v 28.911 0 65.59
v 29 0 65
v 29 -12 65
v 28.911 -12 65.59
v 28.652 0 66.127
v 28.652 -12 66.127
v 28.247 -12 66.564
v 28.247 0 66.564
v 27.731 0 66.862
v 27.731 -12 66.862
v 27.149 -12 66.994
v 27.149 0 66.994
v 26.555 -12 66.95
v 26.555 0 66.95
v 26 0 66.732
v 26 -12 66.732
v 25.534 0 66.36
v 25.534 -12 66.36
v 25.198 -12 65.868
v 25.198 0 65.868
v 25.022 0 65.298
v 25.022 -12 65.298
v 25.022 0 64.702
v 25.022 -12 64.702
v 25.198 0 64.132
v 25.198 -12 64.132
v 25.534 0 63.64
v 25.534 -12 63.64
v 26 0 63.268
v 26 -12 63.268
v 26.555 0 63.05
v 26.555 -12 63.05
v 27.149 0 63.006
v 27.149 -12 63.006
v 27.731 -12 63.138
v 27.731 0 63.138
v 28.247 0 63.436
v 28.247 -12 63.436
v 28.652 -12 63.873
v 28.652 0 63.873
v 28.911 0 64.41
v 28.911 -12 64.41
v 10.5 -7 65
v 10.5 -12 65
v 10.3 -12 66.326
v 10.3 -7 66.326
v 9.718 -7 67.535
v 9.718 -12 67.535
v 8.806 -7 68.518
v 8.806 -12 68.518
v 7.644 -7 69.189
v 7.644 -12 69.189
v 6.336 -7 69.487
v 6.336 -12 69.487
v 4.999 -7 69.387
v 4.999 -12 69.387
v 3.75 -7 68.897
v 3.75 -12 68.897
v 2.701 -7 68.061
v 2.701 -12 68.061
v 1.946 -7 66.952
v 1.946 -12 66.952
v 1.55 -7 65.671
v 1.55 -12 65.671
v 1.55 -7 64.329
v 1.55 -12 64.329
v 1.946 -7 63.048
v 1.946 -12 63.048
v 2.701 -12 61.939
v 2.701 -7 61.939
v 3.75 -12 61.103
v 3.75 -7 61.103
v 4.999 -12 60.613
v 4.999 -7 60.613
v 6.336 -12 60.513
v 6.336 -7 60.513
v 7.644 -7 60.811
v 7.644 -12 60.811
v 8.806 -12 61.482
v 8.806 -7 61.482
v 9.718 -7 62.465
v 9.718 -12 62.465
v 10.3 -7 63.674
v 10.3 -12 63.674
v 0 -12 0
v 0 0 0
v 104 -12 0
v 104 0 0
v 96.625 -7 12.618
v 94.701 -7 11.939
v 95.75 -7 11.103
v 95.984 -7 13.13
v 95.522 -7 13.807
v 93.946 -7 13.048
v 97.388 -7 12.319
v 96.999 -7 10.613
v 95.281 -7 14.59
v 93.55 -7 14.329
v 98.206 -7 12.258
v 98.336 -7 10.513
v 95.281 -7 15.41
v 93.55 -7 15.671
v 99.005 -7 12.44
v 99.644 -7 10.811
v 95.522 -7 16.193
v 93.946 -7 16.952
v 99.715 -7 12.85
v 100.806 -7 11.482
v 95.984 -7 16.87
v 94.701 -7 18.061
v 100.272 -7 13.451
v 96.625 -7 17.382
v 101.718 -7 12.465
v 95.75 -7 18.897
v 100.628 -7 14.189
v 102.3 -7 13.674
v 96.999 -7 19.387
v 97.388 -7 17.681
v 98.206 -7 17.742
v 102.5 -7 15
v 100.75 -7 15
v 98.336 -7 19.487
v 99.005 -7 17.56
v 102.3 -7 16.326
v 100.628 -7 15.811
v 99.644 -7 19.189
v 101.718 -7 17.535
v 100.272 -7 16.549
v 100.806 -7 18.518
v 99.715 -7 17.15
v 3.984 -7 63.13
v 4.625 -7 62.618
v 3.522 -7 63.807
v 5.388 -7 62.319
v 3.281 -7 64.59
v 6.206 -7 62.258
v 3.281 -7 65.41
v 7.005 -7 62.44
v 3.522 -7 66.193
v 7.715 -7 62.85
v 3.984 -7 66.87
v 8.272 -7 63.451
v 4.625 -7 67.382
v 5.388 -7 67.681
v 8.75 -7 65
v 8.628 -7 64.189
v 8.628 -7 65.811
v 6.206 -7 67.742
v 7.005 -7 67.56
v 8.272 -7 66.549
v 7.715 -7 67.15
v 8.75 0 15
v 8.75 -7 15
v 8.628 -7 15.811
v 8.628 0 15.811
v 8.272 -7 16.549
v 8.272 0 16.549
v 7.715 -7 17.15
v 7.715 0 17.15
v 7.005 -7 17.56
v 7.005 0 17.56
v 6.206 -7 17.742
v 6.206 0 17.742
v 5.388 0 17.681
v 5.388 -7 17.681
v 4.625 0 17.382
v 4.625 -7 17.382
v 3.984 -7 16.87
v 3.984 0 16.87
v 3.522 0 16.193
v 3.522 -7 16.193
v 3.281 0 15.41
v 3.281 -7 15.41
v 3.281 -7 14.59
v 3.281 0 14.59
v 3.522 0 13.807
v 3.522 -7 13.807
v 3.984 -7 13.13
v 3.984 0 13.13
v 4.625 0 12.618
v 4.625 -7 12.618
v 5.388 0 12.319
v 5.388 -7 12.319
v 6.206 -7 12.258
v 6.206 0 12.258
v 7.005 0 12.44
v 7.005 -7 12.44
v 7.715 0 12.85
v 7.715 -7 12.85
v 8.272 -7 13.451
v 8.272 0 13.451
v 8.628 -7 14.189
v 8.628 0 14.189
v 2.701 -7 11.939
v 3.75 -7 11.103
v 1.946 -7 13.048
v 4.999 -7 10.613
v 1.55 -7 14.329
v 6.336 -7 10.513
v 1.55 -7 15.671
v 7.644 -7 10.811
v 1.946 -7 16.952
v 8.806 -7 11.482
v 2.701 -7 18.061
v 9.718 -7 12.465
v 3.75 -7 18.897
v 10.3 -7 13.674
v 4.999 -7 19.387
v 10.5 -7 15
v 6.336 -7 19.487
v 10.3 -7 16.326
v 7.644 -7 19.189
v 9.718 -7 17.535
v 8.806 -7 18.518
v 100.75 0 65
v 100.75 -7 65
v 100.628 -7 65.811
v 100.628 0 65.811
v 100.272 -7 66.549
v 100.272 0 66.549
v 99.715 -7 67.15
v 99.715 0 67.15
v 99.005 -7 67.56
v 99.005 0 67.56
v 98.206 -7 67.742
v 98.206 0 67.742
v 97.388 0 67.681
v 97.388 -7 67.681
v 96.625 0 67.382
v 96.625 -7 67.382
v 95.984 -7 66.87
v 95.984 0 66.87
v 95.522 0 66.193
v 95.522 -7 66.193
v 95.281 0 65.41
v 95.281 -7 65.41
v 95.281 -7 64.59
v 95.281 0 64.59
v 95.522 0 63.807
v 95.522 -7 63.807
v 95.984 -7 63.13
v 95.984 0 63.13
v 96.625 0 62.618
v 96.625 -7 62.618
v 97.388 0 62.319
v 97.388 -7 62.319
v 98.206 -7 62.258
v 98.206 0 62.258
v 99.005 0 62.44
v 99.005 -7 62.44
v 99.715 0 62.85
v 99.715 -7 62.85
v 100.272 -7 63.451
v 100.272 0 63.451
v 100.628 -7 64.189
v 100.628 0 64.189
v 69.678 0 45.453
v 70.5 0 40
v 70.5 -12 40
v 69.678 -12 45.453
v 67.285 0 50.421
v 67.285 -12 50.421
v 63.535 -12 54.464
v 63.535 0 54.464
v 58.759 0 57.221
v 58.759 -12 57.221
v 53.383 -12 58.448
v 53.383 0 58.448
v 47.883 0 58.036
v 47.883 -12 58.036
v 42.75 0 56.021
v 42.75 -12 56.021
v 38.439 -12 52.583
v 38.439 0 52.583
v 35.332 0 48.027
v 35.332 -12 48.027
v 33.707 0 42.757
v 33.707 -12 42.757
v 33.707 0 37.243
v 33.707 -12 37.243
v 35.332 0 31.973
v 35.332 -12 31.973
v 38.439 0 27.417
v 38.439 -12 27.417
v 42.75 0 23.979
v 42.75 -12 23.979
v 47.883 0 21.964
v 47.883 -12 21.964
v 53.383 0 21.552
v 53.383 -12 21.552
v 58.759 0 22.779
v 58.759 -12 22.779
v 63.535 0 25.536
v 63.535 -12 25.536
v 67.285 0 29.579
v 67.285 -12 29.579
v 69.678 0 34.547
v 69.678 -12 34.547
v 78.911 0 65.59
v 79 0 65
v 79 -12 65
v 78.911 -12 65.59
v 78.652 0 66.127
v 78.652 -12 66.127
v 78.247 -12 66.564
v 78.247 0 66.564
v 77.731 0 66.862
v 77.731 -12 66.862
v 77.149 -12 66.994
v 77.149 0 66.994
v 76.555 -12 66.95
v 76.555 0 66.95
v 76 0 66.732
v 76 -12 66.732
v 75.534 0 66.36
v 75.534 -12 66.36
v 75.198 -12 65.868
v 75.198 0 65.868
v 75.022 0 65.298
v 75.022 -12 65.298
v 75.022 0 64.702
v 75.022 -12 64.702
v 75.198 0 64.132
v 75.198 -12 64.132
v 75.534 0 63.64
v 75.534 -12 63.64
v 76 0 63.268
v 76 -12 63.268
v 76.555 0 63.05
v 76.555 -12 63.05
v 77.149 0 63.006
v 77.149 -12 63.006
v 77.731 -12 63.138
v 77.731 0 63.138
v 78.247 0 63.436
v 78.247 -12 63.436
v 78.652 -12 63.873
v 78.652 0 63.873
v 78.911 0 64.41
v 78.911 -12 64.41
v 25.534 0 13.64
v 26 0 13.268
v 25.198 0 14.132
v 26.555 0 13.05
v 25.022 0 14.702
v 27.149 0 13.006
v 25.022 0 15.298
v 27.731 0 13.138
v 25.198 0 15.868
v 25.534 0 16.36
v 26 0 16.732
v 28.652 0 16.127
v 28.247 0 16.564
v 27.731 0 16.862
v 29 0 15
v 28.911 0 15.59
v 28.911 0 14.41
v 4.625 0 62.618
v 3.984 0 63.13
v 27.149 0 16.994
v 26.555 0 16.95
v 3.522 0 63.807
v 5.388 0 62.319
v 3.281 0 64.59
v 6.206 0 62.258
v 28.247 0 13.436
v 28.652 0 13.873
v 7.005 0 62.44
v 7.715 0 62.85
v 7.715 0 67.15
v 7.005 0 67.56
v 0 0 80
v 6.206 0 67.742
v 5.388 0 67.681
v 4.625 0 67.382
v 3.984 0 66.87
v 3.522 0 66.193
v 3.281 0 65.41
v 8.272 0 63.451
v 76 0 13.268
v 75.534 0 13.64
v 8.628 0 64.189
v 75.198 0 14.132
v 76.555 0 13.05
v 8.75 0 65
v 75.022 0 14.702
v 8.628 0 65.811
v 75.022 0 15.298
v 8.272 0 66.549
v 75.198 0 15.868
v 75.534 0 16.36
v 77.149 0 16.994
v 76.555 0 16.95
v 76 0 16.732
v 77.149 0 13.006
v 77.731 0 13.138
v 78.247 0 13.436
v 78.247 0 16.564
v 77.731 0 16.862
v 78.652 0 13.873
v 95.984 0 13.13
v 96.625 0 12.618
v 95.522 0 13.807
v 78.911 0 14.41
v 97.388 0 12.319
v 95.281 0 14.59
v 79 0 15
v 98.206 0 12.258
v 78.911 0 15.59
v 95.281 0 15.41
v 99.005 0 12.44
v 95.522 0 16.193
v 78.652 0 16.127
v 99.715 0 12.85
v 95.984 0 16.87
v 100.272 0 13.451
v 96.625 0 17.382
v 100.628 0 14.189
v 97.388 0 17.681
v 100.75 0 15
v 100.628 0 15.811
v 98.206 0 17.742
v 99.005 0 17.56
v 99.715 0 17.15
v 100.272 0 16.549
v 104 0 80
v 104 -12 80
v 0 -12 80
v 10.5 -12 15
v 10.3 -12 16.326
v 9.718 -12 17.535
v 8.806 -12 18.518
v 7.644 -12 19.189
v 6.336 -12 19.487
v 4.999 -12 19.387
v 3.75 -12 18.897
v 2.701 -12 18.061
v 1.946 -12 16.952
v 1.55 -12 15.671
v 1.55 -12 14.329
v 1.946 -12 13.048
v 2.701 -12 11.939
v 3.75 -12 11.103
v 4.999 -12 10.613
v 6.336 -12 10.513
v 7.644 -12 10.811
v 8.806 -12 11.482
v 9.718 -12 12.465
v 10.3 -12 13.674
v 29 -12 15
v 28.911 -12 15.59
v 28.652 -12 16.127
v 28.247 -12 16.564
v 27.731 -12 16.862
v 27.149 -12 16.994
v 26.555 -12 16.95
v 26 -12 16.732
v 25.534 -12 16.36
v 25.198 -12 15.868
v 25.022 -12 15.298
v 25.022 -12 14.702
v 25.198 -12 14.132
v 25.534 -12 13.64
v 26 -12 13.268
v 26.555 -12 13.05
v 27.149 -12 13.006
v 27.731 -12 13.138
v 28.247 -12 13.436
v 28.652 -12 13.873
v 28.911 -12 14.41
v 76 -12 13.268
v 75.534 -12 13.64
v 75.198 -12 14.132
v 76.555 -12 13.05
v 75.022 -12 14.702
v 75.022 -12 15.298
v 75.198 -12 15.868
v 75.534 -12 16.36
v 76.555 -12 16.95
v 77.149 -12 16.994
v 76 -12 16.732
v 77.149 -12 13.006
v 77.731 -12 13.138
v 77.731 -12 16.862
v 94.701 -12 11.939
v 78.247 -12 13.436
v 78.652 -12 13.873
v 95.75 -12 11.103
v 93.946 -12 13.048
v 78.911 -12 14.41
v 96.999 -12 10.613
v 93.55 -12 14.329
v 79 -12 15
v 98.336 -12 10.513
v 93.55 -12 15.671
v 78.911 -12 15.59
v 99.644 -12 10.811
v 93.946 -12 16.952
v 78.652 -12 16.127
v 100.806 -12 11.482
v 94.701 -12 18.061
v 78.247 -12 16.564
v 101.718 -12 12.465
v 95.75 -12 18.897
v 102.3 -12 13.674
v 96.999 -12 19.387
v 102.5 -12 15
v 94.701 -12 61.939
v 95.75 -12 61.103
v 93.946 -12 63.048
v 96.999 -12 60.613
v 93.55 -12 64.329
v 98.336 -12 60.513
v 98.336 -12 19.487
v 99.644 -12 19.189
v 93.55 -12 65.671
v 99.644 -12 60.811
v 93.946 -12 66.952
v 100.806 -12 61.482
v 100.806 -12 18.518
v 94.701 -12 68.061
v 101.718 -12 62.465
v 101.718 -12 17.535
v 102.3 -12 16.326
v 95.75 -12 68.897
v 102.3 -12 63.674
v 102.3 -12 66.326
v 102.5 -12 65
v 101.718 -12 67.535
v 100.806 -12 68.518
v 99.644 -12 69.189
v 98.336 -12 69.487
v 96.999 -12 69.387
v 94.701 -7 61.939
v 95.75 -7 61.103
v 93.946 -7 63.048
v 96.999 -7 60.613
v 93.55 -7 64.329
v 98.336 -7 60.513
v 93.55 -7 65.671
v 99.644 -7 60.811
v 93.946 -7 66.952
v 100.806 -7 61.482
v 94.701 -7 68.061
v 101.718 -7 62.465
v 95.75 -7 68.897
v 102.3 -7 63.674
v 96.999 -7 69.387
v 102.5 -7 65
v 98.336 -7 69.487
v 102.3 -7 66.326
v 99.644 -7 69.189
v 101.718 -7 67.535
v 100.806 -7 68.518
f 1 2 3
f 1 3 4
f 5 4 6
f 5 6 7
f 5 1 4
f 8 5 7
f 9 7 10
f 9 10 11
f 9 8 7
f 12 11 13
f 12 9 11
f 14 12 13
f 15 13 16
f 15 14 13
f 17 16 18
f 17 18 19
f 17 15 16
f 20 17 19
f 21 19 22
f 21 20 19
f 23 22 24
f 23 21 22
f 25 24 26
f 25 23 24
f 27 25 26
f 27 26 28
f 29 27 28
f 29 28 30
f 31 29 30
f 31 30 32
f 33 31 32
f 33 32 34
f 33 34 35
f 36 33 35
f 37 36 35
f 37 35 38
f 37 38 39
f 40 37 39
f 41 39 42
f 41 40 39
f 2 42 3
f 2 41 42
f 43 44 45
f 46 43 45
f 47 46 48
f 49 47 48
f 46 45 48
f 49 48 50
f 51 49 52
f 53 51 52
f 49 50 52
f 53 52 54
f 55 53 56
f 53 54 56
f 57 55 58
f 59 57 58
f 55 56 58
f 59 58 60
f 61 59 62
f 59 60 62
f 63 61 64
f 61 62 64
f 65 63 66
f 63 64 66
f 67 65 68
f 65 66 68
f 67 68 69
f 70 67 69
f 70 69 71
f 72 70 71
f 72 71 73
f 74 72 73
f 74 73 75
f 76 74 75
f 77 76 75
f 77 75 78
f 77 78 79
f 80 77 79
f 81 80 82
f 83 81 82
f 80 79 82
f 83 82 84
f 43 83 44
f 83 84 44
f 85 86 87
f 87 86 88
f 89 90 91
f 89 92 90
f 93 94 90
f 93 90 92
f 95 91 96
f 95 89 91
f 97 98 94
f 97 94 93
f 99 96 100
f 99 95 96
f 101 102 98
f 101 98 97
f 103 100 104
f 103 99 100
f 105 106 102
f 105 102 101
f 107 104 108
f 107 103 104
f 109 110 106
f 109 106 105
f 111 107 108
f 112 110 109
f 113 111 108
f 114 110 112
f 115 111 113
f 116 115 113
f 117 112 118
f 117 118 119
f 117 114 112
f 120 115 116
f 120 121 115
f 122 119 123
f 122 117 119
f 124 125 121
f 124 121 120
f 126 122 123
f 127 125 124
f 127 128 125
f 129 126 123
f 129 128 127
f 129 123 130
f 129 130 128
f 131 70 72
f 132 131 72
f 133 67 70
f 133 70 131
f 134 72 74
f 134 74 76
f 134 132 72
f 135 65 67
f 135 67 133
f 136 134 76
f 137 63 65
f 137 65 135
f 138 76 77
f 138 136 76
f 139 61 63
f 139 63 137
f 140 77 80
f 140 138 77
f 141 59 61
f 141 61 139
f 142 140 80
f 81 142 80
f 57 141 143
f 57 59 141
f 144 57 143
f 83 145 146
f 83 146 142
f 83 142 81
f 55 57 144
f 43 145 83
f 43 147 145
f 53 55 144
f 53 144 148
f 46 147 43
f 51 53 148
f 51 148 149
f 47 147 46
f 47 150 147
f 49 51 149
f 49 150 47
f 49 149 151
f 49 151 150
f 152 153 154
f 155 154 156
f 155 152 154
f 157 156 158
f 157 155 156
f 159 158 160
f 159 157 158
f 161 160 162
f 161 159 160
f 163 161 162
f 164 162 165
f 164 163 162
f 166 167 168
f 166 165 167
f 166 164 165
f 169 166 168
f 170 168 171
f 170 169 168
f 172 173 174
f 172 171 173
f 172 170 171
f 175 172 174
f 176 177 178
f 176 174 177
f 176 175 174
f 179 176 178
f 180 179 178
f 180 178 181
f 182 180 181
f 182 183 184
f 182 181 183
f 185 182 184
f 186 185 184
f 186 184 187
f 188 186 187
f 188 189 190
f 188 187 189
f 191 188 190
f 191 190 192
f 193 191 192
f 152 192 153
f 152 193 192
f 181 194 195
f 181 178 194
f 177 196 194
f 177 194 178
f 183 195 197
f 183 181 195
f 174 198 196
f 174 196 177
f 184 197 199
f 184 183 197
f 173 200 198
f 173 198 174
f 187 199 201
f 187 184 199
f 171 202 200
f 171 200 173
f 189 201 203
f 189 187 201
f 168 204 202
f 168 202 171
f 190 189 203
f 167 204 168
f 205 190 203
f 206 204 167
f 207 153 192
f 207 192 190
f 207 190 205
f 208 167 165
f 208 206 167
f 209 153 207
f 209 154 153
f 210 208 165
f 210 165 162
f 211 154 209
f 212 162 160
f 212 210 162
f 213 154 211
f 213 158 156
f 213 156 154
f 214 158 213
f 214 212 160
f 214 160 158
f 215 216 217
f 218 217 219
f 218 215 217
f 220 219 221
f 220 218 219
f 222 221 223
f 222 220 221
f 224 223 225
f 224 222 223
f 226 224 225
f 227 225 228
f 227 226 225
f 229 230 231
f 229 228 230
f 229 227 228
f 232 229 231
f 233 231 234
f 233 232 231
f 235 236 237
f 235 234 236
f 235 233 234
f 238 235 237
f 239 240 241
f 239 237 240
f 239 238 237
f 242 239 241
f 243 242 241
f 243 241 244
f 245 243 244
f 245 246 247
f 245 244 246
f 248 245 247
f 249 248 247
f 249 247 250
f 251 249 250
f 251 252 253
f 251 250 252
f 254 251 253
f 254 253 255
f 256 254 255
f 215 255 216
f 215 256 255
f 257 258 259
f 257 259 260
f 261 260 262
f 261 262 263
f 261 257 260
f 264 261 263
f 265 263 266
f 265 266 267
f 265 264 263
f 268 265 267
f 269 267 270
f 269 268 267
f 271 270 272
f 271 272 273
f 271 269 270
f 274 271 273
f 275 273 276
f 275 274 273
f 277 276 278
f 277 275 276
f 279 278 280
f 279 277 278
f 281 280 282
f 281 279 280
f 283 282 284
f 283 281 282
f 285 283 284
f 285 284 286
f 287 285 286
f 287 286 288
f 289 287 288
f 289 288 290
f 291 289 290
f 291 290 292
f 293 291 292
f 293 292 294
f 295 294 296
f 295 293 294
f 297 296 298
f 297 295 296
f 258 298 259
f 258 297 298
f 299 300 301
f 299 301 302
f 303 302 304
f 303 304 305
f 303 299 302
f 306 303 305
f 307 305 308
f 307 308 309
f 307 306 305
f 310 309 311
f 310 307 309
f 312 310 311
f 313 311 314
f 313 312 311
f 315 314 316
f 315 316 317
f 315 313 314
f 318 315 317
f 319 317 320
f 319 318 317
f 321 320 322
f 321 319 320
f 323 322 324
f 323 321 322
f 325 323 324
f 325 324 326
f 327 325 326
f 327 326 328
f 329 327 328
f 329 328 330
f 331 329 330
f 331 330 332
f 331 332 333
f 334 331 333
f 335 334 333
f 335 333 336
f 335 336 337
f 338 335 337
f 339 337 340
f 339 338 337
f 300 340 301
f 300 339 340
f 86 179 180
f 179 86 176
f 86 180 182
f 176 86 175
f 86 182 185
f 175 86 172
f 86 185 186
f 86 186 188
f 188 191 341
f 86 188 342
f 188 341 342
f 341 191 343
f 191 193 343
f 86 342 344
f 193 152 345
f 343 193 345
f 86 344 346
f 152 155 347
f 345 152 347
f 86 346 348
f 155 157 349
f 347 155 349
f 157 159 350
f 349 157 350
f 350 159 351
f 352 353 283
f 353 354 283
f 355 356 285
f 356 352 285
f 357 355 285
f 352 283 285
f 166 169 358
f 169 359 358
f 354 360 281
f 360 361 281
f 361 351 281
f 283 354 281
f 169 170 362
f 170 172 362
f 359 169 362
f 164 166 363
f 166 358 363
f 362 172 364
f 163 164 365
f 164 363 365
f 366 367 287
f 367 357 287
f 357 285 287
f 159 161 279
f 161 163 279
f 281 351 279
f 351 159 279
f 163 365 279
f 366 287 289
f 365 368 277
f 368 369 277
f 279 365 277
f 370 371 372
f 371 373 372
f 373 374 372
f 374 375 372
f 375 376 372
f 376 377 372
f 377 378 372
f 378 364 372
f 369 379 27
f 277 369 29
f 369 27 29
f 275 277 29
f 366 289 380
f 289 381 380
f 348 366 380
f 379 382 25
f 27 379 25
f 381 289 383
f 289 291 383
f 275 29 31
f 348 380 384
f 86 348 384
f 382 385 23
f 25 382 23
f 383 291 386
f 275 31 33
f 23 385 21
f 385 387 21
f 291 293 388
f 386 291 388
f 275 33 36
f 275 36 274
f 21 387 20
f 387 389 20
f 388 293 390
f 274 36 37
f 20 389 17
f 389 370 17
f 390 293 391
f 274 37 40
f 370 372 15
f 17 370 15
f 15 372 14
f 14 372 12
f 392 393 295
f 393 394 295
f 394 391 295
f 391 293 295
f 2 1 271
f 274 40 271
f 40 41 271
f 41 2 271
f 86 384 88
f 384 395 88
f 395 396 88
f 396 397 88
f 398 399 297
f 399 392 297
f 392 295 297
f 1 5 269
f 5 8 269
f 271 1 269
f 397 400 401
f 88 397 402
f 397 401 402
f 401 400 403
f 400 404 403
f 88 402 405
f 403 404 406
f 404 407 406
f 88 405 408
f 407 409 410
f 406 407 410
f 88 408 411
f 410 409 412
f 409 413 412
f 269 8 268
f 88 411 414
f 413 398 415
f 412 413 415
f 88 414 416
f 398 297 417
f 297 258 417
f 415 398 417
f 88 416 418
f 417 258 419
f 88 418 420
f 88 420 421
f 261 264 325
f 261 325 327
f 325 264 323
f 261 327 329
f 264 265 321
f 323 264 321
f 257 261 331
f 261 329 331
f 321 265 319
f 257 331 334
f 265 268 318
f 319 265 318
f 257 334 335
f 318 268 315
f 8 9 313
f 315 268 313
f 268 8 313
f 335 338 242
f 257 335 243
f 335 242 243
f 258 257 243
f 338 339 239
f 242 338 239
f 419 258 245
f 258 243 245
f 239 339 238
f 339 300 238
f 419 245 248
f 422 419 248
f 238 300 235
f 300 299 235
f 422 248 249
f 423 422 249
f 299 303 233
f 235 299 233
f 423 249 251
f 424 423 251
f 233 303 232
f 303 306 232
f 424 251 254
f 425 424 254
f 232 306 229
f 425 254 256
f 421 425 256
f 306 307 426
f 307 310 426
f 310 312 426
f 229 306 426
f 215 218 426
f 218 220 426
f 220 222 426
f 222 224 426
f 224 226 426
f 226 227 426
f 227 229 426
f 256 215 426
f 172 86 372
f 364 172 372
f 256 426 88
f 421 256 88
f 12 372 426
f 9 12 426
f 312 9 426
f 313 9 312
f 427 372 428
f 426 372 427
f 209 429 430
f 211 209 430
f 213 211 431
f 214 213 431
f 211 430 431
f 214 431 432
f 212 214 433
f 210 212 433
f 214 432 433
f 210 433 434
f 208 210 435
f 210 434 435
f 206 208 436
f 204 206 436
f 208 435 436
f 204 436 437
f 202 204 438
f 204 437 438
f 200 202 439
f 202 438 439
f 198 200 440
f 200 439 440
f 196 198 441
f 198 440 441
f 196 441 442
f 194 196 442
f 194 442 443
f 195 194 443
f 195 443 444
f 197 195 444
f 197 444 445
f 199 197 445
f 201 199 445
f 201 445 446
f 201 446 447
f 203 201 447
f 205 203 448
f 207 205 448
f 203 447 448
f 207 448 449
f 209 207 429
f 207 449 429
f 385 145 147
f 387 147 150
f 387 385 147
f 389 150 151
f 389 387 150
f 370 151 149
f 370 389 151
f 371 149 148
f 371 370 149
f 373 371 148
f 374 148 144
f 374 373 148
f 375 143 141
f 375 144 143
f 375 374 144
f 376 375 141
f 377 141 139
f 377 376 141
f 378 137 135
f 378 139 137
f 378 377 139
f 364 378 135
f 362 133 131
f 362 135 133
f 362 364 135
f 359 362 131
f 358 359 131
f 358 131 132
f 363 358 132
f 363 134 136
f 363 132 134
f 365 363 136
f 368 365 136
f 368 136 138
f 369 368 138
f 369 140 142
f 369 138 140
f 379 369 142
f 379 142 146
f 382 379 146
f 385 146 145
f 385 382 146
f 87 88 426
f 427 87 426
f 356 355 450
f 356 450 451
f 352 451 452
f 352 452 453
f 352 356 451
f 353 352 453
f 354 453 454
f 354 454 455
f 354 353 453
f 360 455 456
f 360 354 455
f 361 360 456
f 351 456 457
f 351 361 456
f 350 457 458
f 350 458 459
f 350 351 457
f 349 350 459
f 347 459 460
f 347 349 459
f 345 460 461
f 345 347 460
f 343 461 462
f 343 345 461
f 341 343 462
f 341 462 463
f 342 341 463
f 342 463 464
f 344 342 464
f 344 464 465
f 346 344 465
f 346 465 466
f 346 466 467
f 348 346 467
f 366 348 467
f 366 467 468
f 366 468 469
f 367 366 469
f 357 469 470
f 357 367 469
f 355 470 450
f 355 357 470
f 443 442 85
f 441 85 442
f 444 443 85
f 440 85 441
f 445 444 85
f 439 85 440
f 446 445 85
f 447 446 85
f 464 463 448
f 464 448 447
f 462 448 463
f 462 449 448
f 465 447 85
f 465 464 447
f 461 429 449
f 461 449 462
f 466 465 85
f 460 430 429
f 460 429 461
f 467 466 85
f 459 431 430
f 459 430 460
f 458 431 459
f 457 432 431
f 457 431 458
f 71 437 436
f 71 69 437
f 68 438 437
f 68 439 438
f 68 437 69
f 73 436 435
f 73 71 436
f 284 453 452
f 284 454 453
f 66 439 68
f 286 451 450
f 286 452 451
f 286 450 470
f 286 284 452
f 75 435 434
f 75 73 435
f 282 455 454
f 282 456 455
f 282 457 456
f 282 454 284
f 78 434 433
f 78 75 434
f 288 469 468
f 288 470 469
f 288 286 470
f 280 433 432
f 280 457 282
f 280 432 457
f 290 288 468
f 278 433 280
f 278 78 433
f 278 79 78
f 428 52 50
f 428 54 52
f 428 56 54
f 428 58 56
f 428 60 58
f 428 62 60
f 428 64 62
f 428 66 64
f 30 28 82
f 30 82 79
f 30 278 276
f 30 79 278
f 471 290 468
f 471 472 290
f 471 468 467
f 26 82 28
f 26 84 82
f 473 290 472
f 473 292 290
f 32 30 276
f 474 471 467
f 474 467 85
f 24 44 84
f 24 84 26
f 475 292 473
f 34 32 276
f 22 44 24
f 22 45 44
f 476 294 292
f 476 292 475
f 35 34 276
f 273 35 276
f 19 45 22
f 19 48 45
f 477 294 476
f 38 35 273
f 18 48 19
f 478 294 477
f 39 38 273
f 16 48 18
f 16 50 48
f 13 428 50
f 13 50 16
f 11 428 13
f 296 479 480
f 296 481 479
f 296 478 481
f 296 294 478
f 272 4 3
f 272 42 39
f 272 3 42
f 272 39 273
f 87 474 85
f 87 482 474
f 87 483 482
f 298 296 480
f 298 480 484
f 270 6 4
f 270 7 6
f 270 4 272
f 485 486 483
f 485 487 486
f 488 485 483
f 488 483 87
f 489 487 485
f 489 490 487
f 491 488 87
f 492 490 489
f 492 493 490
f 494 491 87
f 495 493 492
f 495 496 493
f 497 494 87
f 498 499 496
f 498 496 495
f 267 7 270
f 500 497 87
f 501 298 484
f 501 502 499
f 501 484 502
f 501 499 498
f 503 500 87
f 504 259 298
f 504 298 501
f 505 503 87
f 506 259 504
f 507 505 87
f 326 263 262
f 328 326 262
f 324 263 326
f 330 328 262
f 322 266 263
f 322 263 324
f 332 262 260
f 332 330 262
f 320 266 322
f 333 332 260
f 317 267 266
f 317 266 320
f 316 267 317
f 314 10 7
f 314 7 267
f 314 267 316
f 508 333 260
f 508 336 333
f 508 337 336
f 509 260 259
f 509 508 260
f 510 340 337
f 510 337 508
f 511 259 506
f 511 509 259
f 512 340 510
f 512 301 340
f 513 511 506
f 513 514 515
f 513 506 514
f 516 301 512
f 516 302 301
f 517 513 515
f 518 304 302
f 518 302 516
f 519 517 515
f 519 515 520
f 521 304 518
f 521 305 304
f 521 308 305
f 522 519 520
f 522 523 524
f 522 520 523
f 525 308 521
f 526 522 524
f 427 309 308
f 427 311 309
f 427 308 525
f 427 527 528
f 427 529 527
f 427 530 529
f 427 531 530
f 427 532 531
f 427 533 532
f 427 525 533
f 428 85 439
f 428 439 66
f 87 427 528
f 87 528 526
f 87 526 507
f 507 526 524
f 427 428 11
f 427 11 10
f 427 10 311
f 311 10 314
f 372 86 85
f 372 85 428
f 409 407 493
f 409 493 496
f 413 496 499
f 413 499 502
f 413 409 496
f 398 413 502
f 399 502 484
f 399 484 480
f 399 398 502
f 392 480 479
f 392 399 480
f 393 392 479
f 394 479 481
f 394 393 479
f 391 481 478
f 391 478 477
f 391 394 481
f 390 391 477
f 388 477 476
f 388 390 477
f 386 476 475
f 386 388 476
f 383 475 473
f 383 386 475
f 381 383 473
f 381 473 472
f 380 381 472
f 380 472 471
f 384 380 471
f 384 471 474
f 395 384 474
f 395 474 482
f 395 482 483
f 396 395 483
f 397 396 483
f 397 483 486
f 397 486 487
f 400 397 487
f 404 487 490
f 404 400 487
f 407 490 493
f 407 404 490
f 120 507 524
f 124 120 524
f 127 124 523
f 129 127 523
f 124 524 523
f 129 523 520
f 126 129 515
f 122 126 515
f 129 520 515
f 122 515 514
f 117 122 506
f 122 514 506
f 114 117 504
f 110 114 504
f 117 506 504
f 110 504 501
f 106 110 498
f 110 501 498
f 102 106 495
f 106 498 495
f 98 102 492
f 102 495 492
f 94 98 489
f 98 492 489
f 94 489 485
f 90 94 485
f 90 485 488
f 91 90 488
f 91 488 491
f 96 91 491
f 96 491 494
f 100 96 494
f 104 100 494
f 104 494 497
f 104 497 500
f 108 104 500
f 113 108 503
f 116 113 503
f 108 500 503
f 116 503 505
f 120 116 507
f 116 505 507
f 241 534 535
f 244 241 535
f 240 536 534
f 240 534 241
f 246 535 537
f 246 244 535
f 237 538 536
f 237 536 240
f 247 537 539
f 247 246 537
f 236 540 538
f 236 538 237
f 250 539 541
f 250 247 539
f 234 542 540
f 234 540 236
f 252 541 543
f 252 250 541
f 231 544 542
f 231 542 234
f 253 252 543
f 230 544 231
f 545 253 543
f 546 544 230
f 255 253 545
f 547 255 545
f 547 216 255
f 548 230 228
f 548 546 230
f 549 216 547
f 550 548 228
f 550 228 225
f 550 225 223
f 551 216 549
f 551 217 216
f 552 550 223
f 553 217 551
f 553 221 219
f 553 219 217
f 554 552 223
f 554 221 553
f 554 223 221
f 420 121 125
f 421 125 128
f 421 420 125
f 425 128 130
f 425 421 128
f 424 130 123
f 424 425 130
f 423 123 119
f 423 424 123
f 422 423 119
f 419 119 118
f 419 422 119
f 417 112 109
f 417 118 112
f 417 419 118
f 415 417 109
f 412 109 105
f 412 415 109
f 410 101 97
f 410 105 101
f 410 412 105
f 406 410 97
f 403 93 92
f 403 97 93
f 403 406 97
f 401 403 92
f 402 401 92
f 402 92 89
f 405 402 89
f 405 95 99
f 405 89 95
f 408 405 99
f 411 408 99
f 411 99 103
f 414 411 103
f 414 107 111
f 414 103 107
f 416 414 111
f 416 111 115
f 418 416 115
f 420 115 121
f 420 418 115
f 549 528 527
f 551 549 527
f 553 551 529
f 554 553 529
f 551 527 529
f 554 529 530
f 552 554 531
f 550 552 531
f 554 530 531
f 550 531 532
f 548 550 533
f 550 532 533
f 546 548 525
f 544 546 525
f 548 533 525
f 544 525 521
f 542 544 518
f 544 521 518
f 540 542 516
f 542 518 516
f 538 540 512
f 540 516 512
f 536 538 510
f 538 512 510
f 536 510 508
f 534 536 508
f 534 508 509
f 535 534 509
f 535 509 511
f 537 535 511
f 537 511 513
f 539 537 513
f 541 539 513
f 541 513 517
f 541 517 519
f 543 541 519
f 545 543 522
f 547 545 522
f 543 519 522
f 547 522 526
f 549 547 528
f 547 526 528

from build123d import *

# Parameters (mm, degrees)
F0_W     = 104
F0_H     = 80
F0_R     = 2.75
F0_R_2   = 2
F0_R_3   = 18.5
F1_DEPTH = 12
F2_R     = 4.5
F3_DEPTH = 5


with BuildPart() as f1:
    # F0 (on Front) → F1 (new body)
    with BuildSketch(Plane.XZ):
        with Locations((52, 40)):
            Rectangle(F0_W, F0_H)
        with Locations((6, 15)):
            Circle(F0_R, mode=Mode.SUBTRACT)
        with Locations((27, 15)):
            Circle(F0_R_2, mode=Mode.SUBTRACT)
        with Locations((77, 15)):
            Circle(F0_R_2, mode=Mode.SUBTRACT)
        with Locations((98, 15)):
            Circle(F0_R, mode=Mode.SUBTRACT)
        with Locations((6, 65)):
            Circle(F0_R, mode=Mode.SUBTRACT)
        with Locations((27, 65)):
            Circle(F0_R_2, mode=Mode.SUBTRACT)
        with Locations((52, 40)):
            Circle(F0_R_3, mode=Mode.SUBTRACT)
        with Locations((77, 65)):
            Circle(F0_R_2, mode=Mode.SUBTRACT)
        with Locations((98, 65)):
            Circle(F0_R, mode=Mode.SUBTRACT)
    extrude(amount=F1_DEPTH)

    # F2 (on face) → F3 (cut)
    with BuildSketch(Plane.XZ.offset(12)):
        with Locations((6, 65)):
            Circle(F2_R)
        with Locations((98, 65)):
            Circle(F2_R)
        with Locations((98, 15)):
            Circle(F2_R)
        with Locations((6, 15)):
            Circle(F2_R)
    extrude(amount=-F3_DEPTH, mode=Mode.SUBTRACT)


solid = f1.part
